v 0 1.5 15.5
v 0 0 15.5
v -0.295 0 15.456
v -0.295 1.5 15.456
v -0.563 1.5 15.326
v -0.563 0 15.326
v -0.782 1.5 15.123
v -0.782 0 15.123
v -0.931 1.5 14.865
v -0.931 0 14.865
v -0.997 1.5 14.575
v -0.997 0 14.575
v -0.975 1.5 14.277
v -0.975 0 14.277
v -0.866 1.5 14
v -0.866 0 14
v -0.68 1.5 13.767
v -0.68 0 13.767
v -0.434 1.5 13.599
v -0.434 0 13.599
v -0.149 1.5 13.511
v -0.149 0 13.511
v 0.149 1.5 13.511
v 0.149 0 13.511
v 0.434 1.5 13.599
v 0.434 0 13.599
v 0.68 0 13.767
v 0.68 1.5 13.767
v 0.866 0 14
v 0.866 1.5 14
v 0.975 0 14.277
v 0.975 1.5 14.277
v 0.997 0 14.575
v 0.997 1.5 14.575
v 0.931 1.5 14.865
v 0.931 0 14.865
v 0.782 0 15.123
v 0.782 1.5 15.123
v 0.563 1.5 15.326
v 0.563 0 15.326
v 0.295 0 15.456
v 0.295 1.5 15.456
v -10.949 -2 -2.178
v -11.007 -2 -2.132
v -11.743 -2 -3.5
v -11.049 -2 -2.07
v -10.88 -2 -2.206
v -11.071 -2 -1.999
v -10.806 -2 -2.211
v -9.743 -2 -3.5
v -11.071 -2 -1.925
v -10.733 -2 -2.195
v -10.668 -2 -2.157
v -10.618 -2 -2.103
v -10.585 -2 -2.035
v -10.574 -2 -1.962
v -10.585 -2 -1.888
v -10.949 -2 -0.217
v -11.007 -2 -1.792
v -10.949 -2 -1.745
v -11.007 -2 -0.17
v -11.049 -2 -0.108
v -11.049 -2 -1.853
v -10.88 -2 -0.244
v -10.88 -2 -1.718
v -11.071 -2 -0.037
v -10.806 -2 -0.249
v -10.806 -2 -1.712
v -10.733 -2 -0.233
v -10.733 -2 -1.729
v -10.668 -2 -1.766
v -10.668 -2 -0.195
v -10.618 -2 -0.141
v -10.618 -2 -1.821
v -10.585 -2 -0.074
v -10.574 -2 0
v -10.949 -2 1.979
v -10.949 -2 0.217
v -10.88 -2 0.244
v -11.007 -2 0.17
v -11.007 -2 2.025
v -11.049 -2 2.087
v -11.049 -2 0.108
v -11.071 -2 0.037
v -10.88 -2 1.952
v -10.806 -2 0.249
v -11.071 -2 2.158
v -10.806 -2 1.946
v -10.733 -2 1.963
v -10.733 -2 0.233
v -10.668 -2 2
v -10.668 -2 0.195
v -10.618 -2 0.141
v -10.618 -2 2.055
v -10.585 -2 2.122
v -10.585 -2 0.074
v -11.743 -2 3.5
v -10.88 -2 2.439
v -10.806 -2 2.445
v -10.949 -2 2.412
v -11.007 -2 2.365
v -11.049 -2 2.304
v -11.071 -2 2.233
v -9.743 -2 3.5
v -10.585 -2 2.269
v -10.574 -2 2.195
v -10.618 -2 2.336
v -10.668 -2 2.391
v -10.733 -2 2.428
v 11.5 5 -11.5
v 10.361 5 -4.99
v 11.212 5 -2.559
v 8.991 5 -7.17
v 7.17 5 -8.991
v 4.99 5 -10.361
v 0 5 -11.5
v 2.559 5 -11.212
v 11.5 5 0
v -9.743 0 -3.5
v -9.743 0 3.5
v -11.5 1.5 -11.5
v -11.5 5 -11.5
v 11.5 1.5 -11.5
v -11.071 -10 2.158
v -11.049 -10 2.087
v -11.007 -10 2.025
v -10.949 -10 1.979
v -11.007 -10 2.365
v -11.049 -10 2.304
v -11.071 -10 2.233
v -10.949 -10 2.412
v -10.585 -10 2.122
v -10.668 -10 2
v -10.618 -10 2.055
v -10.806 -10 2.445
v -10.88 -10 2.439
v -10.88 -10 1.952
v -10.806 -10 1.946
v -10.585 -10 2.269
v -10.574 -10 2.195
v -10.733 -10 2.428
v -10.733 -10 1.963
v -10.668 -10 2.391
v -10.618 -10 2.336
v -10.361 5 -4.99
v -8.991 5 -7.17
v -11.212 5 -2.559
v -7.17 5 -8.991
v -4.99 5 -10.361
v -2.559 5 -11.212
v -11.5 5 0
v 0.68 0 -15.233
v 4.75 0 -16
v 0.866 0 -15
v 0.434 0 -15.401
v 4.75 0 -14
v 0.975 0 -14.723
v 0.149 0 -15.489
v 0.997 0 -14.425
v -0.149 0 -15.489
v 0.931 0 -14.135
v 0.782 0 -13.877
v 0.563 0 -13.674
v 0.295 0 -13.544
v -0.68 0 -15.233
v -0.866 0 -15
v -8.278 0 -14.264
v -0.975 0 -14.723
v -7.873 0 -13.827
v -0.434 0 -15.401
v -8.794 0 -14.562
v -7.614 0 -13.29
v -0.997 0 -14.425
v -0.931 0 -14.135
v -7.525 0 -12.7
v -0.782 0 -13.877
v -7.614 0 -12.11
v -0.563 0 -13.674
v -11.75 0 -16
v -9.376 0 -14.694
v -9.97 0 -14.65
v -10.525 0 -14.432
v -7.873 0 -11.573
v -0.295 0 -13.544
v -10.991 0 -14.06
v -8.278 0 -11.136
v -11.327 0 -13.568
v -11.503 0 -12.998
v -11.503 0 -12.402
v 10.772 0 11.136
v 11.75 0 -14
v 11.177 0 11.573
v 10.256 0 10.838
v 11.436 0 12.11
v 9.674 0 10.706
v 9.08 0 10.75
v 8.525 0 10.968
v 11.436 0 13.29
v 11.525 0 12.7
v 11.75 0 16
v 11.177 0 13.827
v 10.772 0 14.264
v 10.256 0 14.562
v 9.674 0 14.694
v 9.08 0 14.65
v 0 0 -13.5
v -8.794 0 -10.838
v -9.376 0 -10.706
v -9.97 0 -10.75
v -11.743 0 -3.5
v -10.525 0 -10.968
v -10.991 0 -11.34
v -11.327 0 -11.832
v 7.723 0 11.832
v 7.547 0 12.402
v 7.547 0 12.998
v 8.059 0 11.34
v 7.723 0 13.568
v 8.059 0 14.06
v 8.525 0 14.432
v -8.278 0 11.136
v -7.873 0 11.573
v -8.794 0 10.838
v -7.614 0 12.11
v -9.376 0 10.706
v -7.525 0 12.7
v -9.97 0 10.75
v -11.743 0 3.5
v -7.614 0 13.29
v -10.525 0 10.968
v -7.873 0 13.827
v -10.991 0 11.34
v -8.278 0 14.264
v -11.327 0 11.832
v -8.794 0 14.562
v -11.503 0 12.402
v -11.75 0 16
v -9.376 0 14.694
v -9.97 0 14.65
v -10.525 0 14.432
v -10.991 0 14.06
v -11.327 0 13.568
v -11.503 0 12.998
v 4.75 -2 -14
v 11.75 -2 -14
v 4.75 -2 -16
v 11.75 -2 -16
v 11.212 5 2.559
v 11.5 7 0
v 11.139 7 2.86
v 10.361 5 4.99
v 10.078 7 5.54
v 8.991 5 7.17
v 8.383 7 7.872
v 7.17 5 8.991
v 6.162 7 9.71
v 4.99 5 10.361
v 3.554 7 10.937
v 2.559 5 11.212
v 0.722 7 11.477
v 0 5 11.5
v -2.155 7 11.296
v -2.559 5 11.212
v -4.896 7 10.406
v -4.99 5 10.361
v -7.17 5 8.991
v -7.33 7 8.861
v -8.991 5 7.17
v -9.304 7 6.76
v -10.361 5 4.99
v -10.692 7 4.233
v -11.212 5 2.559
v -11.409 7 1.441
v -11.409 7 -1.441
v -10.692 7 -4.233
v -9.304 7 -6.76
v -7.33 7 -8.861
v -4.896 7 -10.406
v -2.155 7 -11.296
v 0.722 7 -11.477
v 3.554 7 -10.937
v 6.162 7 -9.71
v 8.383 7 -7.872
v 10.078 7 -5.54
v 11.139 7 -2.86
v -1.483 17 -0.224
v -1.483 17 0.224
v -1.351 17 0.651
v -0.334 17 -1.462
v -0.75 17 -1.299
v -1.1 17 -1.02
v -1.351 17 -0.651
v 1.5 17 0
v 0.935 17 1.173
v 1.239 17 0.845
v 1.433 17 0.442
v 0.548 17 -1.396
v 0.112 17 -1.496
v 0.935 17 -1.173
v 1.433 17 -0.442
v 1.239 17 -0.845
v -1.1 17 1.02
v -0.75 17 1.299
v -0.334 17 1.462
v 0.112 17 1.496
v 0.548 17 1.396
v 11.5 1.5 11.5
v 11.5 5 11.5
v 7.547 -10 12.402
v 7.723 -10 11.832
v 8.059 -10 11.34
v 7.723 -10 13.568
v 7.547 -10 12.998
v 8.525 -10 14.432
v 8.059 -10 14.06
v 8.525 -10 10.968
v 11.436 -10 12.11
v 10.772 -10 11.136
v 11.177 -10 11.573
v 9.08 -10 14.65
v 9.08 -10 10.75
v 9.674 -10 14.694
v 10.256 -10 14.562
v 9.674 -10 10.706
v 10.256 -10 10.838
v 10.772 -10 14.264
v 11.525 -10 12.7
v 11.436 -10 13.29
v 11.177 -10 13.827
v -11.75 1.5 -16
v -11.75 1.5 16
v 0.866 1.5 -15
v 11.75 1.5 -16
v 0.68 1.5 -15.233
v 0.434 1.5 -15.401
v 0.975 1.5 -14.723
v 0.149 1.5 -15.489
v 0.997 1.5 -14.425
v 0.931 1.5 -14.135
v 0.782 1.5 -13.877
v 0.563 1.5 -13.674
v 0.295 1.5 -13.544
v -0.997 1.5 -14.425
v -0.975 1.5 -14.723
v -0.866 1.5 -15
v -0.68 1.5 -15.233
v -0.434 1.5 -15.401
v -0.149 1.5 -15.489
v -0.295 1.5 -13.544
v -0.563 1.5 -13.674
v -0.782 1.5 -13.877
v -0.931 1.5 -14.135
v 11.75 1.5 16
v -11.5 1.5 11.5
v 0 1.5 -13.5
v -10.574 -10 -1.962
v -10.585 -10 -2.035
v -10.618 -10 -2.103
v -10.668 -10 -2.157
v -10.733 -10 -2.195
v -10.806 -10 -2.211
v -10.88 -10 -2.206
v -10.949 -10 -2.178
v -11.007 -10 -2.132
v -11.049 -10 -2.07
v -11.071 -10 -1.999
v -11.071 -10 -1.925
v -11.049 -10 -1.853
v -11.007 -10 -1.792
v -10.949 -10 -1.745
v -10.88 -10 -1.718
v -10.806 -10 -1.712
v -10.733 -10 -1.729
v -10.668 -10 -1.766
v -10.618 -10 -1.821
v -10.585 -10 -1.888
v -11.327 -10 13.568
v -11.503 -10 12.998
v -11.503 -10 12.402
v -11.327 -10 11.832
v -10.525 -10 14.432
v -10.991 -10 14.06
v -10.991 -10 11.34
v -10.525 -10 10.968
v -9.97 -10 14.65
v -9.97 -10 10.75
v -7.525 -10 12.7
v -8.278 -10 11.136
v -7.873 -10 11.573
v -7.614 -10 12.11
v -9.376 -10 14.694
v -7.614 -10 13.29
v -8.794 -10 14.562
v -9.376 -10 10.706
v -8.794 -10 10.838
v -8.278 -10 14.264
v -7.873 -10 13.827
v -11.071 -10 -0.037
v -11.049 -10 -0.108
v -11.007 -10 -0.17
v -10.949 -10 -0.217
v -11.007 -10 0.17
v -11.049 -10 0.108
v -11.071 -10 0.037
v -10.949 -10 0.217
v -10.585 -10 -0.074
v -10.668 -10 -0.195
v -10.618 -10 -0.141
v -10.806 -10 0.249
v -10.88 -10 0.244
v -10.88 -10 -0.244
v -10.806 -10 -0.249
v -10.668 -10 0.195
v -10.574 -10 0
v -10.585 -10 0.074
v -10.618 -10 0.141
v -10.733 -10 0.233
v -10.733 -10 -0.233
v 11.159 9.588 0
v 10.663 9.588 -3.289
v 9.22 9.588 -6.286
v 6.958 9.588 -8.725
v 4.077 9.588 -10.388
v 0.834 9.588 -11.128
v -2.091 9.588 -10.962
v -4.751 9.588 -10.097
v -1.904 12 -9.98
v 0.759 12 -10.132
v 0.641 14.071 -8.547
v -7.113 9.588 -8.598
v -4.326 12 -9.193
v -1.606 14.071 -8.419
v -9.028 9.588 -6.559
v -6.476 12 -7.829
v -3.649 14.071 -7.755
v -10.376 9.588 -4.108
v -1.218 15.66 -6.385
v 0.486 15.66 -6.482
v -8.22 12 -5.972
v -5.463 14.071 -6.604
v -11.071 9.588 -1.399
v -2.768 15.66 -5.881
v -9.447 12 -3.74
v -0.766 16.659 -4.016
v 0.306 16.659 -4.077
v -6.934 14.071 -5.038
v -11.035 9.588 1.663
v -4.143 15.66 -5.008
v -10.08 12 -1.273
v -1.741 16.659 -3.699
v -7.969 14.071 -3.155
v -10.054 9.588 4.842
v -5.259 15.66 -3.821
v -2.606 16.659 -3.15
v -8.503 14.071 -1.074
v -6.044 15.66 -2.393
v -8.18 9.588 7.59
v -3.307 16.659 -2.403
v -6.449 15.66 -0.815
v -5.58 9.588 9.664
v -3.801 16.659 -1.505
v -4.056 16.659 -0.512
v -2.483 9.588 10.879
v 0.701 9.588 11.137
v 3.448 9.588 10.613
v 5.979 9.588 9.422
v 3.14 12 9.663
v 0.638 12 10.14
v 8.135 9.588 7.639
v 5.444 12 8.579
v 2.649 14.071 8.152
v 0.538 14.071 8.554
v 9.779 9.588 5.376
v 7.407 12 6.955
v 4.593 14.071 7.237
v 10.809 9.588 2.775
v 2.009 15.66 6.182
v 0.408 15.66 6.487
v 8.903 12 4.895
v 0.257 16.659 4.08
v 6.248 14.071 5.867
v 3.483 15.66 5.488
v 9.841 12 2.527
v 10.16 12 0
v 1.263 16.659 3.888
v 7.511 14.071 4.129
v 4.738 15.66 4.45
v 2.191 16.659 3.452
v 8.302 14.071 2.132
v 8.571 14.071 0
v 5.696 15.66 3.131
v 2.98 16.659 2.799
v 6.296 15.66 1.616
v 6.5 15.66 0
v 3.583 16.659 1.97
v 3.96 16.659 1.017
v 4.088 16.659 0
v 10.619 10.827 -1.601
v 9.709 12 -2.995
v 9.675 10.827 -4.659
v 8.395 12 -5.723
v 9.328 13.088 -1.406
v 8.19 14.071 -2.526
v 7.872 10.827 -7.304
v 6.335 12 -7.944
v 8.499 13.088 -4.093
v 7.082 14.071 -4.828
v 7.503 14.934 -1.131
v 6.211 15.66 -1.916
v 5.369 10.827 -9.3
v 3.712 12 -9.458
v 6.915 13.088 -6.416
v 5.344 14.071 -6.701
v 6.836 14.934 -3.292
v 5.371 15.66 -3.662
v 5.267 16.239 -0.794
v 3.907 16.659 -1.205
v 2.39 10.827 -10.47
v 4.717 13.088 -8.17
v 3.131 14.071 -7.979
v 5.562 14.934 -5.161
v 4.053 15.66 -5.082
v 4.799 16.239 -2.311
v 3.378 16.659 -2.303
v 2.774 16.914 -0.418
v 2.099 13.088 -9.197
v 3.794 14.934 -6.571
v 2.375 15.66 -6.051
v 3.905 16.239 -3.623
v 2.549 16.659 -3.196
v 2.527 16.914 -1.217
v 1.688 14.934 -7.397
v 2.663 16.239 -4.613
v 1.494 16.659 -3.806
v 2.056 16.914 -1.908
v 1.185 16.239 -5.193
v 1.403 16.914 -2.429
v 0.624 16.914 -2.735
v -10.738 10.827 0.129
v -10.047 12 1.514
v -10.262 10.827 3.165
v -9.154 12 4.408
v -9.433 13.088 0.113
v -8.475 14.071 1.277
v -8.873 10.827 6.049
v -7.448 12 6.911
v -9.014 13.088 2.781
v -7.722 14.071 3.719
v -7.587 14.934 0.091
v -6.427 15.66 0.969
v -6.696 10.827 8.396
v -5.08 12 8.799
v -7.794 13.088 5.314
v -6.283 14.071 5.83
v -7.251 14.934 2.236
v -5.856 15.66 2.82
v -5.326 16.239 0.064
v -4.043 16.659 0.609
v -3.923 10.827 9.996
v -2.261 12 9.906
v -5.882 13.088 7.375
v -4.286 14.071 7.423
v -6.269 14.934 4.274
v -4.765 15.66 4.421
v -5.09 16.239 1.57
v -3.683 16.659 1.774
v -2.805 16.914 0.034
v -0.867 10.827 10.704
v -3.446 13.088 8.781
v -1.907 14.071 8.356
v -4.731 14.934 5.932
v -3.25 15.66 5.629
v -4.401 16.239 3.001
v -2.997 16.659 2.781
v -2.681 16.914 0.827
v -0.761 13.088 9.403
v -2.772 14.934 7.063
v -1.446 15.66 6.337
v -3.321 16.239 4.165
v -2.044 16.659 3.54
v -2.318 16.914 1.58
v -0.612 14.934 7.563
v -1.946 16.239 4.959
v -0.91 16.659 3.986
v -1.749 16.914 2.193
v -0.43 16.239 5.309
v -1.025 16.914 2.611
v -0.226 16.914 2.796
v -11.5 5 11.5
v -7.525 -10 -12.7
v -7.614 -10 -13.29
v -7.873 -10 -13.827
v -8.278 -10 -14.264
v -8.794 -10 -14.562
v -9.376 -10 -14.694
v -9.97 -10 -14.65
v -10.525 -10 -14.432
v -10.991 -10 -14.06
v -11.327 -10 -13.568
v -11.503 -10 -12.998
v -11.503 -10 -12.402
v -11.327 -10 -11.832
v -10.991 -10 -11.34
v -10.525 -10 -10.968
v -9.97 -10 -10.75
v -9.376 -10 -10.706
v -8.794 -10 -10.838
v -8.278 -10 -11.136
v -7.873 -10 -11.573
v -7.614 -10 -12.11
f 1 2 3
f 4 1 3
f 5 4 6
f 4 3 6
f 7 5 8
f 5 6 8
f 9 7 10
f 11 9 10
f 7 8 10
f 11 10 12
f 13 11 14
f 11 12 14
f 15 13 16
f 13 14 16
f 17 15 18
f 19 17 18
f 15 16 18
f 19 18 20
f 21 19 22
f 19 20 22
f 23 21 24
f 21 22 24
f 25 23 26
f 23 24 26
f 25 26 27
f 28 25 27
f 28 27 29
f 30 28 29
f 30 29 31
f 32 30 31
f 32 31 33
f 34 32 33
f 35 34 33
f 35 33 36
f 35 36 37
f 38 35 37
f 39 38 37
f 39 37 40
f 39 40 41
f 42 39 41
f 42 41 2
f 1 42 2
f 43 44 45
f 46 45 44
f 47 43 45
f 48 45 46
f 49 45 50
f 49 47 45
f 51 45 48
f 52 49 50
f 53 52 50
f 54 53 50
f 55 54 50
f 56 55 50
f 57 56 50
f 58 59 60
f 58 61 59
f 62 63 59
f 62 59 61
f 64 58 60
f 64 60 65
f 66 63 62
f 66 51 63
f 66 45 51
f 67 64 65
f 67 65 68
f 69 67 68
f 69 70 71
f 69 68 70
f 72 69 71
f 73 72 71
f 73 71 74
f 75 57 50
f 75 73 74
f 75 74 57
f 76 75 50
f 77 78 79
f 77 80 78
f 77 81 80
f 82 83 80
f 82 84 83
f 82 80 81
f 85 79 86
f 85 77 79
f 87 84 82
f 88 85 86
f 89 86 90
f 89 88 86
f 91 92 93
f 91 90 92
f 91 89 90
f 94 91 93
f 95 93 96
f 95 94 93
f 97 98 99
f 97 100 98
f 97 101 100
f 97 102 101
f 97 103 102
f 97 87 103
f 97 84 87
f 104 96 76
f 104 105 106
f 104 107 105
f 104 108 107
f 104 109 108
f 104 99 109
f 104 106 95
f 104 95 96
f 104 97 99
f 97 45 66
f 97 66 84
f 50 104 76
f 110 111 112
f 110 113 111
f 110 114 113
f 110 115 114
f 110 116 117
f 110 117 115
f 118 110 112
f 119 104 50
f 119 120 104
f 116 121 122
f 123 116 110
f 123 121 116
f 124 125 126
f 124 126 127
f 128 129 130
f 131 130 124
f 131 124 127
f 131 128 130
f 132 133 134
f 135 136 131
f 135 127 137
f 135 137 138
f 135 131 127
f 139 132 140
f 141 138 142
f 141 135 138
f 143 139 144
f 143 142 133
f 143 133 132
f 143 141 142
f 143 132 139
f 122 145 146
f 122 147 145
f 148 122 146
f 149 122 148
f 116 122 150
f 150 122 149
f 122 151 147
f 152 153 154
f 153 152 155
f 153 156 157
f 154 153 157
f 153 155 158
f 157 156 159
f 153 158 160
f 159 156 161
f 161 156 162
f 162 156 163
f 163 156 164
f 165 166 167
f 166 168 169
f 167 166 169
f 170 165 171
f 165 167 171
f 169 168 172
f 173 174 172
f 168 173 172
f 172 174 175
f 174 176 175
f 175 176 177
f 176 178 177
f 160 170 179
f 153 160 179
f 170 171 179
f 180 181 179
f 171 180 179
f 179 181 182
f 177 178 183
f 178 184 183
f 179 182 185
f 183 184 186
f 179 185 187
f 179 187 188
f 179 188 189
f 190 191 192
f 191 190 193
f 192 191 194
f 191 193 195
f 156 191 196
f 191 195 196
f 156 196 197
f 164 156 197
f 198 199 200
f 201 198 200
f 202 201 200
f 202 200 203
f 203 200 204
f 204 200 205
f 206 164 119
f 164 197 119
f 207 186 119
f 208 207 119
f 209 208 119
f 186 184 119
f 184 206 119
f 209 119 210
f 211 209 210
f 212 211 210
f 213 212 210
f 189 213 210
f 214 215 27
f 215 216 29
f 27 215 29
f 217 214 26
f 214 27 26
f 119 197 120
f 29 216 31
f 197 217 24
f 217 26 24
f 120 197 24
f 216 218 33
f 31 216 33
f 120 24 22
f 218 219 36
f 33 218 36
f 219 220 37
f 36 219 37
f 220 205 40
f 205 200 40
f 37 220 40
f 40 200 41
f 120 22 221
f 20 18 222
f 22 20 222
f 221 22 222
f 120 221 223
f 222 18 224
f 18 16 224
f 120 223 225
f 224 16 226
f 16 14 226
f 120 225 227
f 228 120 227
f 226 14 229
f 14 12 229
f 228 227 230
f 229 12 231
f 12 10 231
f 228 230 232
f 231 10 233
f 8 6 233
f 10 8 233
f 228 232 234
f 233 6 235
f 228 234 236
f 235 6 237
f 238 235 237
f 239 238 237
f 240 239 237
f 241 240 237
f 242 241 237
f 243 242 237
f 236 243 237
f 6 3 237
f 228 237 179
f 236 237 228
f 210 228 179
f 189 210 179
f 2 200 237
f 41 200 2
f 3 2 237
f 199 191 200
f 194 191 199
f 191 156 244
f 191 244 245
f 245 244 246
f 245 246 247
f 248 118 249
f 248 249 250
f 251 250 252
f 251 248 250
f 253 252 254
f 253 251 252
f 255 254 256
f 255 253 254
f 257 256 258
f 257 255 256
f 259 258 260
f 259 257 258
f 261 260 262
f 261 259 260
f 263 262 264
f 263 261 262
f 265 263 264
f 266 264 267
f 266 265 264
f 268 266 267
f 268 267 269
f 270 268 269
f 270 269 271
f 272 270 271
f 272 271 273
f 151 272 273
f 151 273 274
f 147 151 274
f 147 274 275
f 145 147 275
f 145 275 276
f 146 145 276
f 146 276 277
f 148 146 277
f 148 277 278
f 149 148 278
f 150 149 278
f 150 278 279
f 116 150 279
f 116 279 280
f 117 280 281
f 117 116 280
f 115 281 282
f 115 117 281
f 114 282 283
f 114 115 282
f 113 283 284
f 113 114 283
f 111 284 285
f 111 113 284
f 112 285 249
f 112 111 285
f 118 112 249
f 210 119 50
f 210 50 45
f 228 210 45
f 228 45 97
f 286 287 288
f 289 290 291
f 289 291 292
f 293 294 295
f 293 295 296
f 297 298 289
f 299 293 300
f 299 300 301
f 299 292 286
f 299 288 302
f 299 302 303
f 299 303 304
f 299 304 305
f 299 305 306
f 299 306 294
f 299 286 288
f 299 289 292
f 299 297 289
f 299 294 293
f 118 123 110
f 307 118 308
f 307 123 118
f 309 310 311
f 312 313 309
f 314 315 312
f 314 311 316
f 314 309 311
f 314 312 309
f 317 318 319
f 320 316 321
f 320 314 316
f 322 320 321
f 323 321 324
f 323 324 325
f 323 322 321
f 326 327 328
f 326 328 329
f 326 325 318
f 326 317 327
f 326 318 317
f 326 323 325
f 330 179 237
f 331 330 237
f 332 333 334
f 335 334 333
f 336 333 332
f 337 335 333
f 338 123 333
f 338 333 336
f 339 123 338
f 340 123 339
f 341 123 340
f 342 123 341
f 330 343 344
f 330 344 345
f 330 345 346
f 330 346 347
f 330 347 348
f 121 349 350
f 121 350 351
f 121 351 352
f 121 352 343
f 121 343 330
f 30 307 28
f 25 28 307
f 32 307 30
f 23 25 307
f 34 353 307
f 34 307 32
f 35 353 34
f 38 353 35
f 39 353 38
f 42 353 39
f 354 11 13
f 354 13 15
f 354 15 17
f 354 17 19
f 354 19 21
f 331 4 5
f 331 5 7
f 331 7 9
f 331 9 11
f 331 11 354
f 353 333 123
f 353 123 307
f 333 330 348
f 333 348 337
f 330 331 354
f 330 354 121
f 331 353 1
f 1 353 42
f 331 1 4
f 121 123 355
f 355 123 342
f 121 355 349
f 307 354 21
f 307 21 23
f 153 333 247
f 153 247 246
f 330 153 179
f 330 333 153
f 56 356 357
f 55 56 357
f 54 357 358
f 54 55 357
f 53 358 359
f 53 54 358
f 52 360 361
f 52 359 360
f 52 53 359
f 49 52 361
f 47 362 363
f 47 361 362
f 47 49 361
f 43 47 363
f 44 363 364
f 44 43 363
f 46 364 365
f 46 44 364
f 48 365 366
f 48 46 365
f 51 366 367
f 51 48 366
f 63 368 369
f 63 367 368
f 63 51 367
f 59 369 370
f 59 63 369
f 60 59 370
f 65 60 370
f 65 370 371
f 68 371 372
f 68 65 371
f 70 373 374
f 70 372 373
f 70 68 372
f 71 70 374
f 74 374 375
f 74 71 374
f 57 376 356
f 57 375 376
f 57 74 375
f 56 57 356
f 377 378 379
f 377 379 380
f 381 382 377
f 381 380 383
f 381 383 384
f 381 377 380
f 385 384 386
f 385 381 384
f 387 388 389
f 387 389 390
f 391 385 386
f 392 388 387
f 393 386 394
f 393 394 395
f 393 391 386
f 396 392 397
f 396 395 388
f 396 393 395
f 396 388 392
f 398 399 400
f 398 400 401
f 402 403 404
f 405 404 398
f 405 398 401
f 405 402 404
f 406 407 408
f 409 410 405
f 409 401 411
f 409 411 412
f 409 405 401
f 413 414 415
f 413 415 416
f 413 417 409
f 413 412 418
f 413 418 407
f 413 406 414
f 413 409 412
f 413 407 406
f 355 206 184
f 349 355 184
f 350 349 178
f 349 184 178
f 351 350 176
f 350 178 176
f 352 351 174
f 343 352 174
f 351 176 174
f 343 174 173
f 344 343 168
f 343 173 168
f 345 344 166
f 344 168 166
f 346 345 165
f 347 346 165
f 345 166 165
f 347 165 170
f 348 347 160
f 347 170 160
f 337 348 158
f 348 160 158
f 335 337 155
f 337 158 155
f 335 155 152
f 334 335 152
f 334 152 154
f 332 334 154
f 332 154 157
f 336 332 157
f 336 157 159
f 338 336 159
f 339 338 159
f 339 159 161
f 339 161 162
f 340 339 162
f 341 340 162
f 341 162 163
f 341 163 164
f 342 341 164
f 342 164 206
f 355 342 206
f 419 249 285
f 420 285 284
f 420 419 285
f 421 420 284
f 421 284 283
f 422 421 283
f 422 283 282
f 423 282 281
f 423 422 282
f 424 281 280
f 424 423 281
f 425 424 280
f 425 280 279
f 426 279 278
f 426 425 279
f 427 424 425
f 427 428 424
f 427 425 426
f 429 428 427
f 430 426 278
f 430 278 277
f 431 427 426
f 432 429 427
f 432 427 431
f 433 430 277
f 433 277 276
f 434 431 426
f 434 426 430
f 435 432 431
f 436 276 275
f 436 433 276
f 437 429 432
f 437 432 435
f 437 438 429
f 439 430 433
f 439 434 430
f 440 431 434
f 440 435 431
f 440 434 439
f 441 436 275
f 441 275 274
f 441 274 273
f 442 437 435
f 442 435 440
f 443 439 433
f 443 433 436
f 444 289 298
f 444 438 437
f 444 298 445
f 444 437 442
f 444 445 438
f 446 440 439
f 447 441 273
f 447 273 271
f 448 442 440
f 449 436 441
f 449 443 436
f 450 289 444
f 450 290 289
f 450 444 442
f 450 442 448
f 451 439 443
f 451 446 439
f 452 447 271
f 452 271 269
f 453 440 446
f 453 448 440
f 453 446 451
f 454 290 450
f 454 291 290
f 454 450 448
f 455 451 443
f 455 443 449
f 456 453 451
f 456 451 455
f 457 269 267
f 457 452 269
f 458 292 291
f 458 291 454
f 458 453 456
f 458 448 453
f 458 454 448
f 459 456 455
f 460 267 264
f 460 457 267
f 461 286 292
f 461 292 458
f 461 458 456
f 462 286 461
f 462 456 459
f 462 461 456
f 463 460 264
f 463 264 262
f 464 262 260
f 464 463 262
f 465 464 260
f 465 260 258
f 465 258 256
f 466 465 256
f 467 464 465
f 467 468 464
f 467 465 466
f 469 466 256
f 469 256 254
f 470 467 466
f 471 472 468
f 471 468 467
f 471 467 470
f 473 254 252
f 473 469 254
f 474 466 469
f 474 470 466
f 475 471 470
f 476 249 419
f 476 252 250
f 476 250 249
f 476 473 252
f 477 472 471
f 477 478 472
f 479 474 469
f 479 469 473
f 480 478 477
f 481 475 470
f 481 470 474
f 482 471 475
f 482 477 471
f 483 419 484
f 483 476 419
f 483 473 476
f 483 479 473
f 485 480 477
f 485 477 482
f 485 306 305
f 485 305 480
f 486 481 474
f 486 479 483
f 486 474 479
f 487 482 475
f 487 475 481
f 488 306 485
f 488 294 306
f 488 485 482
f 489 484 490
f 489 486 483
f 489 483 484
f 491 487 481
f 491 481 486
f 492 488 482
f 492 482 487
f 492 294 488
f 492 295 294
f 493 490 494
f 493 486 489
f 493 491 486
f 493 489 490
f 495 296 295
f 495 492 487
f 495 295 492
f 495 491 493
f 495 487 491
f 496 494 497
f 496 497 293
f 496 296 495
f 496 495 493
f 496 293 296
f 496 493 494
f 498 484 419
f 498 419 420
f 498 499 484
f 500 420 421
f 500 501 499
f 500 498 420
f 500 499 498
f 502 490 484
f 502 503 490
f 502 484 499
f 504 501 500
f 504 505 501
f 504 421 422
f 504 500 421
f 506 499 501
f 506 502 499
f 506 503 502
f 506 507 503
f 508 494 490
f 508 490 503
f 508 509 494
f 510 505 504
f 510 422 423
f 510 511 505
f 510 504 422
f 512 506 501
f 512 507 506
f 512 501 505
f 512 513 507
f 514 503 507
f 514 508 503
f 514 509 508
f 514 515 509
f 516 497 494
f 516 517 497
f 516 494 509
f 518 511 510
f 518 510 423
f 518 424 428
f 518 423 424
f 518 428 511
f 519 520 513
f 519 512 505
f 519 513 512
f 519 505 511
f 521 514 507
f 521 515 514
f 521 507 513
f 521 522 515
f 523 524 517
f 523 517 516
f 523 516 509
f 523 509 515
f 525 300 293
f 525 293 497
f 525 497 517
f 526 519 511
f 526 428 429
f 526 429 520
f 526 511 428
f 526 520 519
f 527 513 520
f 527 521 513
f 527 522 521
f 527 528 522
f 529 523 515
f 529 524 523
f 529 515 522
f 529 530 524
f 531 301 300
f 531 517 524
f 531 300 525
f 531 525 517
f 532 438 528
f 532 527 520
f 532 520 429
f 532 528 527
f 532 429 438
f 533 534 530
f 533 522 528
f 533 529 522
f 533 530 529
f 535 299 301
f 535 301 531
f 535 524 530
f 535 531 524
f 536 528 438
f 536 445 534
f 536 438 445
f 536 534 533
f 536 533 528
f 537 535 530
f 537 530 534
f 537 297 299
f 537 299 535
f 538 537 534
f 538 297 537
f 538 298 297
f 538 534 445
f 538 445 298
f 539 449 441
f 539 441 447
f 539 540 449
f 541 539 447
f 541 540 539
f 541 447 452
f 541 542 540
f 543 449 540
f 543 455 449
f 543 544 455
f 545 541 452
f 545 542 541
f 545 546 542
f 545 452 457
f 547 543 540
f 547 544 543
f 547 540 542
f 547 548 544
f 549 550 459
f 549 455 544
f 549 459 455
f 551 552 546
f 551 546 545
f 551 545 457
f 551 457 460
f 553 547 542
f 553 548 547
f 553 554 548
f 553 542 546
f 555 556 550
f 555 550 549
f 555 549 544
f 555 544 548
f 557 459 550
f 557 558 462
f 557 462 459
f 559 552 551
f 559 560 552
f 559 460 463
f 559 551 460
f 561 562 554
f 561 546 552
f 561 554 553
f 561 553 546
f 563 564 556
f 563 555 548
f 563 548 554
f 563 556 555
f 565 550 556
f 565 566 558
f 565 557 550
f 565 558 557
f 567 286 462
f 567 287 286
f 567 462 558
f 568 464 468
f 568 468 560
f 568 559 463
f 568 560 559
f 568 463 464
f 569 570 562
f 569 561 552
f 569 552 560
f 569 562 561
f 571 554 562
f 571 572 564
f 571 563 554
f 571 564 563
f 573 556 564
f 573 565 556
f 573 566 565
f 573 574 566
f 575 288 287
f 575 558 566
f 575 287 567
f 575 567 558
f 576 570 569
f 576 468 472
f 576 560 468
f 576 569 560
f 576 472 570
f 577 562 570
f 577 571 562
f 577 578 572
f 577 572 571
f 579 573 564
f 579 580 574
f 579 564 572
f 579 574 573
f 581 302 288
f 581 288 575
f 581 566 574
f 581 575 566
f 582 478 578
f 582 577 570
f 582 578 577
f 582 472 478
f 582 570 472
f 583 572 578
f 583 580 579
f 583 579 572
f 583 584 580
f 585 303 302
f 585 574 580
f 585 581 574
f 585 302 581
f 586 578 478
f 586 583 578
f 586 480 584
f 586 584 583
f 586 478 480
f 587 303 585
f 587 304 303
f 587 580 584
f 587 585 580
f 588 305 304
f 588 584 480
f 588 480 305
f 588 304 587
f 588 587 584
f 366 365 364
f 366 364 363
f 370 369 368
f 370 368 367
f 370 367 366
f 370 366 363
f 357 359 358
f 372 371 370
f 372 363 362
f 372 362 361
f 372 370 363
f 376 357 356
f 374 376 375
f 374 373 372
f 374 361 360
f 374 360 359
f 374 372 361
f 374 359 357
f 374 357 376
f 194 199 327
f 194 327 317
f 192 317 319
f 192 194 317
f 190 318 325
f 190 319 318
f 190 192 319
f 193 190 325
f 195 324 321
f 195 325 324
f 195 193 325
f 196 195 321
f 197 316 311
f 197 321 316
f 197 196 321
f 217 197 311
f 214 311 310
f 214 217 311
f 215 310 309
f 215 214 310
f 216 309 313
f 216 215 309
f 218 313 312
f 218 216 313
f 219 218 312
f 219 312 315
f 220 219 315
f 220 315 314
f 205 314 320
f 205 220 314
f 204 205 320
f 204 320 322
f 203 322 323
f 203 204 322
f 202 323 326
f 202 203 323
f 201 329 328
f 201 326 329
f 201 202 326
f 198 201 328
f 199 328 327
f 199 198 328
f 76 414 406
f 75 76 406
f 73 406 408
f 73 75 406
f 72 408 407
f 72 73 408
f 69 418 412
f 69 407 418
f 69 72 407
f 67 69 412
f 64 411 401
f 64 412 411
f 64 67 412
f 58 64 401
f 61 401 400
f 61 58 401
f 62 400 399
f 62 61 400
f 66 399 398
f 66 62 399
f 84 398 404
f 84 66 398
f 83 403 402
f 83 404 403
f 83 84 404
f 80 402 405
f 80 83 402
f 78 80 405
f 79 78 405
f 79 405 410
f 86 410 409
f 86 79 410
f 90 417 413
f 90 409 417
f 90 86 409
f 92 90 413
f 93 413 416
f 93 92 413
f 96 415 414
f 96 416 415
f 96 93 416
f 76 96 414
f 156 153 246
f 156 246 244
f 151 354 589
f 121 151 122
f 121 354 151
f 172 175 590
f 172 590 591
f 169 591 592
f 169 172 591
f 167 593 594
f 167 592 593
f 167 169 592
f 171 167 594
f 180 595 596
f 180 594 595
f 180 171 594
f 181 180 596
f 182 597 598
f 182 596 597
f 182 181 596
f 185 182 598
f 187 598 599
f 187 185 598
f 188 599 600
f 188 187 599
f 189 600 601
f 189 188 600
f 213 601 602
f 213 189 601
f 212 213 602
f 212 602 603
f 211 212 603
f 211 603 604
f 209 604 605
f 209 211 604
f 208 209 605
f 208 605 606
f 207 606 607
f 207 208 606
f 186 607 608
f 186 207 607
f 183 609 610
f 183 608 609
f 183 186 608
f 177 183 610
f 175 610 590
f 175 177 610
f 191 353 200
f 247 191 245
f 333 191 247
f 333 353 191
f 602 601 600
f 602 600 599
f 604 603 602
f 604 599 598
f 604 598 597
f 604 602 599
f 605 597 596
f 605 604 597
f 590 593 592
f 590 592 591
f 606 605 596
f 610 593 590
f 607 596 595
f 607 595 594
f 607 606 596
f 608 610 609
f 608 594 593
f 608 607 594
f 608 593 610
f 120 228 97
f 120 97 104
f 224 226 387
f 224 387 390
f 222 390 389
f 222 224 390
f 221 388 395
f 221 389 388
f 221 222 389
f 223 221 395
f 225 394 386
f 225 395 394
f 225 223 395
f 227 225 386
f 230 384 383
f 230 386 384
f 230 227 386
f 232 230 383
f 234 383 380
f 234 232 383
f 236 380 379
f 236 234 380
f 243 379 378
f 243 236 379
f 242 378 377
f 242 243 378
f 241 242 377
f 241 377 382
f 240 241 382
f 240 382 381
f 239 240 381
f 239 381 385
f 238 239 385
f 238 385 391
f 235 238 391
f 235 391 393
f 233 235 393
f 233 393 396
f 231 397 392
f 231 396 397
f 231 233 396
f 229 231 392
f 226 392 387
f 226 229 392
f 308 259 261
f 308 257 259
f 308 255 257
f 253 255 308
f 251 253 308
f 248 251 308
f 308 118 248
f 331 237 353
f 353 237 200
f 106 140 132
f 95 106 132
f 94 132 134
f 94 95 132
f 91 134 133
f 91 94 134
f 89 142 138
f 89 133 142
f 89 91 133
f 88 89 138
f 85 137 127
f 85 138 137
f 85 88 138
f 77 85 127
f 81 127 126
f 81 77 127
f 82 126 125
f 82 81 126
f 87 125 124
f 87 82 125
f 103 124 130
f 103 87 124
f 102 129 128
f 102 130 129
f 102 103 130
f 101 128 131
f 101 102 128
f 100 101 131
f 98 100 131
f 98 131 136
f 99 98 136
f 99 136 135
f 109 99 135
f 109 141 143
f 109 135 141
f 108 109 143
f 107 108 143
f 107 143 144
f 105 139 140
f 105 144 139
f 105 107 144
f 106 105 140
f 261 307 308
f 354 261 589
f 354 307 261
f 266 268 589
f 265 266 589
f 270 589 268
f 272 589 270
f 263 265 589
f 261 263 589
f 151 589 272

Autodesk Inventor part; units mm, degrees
ref_plane "YZ Plane" through (0, 0, 0) normal (1, 0, 0) x (0, 1, 0)
ref_plane "XZ Plane" through (0, 0, 0) normal (0, 1, 0) x (-1, 0, 0)
ref_plane "XY Plane" through (0, 0, 0) normal (0, 0, 1) x (1, 0, 0)
sketch "Sketch1" plane through (0, 0, 0) normal (0, 1, 0) x (-1, 0, 0)
  line L0 (11.75, 16) -> (-11.75, 16)
  line L1 (-11.75, 16) -> (-11.75, -16)
  line L2 (-11.75, -16) -> (11.75, -16)
  line L3 (11.75, -16) -> (11.75, 16)
  point P0 (0, 0)
  dimension "d0" = 23.5
  dimension "d1" = 32
extrude "Extrusion1" add sketch "Sketch1" along normal blind 1.5
sketch "Sketch2" plane through (0, 1.5, 0) normal (0, 1, 0) x (1, 0, 0)
  line L0 (-11.5, 11.5) -> (11.5, 11.5)
  line L1 (11.5, 11.5) -> (11.5, -11.5)
  line L2 (11.5, -11.5) -> (-11.5, -11.5)
  line L3 (-11.5, -11.5) -> (-11.5, 11.5)
  line L4 (-11.5, 11.5) -> (11.5, -11.5) construction
  line L5 (11.5, 11.5) -> (-11.5, -11.5) construction
  point P0 (0, 0)
  dimension "d4" = 23
  dimension "d5" = 23
extrude "Extrusion2" add sketch "Sketch2" along normal blind 3.5
sketch "Sketch3" plane through (0, 5, 0) normal (0, 1, 0) x (1, 0, 0)
  circle A0 centre (0, 0) radius 11.5
  dimension "d8" = 23
extrude "Extrusion3" add sketch "Sketch3" along normal blind 12
fillet "Fillet1" radius 10 1 edges at (-11.5, 17, 0)
sketch "Sketch4" plane through (0, 0, 0) normal (0, -1, 0) x (1, 0, 0)
  line L0 (11.75, -16) -> (-11.75, -16) projected
  line L1 (-11.75, -16) -> (-11.75, 16) projected
  circle A0 centre (-11.75, -16) radius 2
  line L2 (-11.75, 16) -> (11.75, 16) projected
  circle A1 centre (-11.75, 16) radius 2
  circle A2 centre (11.75, 16) radius 2
  line L3 (11.75, -16) -> (4.75, -16)
  line L4 (4.75, -16) -> (4.75, -14)
  line L5 (4.75, -14) -> (11.75, -14)
  line L6 (11.75, -14) -> (11.75, -16)
  line L7 (11.75, 16) -> (11.75, -16) projected
  line L8 (4.75, -15.5) -> (3.0316, -15.5)
  point P0 (0, 0)
  dimension "d13" = 4
  dimension "d14" = 4
  dimension "d20" = 4
  dimension "d21" = 7
  dimension "d22" = 2
  dimension "d36" = 0.5
sketch "Sketch5" plane through (0, 0, 0) normal (0, -1, 0) x (1, 0, 0)
  line L0 (-9.743, 3.5) -> (-9.743, -3.5)
  line L1 (-9.743, -3.5) -> (-11.743, -3.5)
  line L2 (-11.743, -3.5) -> (-11.743, 3.5)
  line L3 (-11.743, 3.5) -> (-9.743, 3.5)
  line L4 (-11.75, -16) -> (-11.75, 16) projected
  point P0 (0, 0)
  point P1 (-11.75, 0)
  dimension "d16" = 7
  dimension "d17" = 2
extrude "Extrusion4" add sketch "Sketch5" along normal blind 2
extrude "Extrusion5" add sketch "Sketch4" along normal blind 2 contours L0 L4 L5 L6
sketch "Sketch6" plane through (0, 0, 0) normal (0, -1, 0) x (1, 0, 0)
  circle A0 centre (9.525, 12.7) radius 2
  circle A1 centre (-9.525, 12.7) radius 2
  circle A2 centre (-9.525, -12.7) radius 2
  point P0 (0, 0)
  dimension "d26" = 4
  dimension "d27" = 4
  dimension "d28" = 4
extrude "Extrusion6" add sketch "Sketch6" along normal blind 10
sketch "Sketch7" plane through (0, -2, 0) normal (0, -1, 0) x (1, 0, 0)
  circle A0 centre (-10.8242, 0) radius 0.25
  circle A1 centre (-10.8242, 2.1954) radius 0.25
  circle A2 centre (-10.8242, -1.9618) radius 0.25
  point P0 (0, 0)
  dimension "d31" = 0.5
  dimension "d32" = 0.5
  dimension "d33" = 0.5
extrude "Extrusion7" add sketch "Sketch7" along normal blind 8
sketch "Sketch8" plane through (0, 1.5, 0) normal (0, 1, 0) x (1, 0, 0)
  circle A0 centre (0, 14.5) radius 1
  line L0 (0, 11.5) -> (-11.5, 11.5) projected
  circle A1 centre (0, -14.5) radius 1
  line L1 (-11.5, -11.5) -> (0, -11.5) projected
  point P0 (0, 0)
  dimension "d37" = 2
  dimension "d38" = 2
hole "Hole1" at (0, 1.5, -14.5) at (0, 1.5, 14.5) direction (0, -1, 0) diameter 2 end through all
properties part number "MotionSensor"
